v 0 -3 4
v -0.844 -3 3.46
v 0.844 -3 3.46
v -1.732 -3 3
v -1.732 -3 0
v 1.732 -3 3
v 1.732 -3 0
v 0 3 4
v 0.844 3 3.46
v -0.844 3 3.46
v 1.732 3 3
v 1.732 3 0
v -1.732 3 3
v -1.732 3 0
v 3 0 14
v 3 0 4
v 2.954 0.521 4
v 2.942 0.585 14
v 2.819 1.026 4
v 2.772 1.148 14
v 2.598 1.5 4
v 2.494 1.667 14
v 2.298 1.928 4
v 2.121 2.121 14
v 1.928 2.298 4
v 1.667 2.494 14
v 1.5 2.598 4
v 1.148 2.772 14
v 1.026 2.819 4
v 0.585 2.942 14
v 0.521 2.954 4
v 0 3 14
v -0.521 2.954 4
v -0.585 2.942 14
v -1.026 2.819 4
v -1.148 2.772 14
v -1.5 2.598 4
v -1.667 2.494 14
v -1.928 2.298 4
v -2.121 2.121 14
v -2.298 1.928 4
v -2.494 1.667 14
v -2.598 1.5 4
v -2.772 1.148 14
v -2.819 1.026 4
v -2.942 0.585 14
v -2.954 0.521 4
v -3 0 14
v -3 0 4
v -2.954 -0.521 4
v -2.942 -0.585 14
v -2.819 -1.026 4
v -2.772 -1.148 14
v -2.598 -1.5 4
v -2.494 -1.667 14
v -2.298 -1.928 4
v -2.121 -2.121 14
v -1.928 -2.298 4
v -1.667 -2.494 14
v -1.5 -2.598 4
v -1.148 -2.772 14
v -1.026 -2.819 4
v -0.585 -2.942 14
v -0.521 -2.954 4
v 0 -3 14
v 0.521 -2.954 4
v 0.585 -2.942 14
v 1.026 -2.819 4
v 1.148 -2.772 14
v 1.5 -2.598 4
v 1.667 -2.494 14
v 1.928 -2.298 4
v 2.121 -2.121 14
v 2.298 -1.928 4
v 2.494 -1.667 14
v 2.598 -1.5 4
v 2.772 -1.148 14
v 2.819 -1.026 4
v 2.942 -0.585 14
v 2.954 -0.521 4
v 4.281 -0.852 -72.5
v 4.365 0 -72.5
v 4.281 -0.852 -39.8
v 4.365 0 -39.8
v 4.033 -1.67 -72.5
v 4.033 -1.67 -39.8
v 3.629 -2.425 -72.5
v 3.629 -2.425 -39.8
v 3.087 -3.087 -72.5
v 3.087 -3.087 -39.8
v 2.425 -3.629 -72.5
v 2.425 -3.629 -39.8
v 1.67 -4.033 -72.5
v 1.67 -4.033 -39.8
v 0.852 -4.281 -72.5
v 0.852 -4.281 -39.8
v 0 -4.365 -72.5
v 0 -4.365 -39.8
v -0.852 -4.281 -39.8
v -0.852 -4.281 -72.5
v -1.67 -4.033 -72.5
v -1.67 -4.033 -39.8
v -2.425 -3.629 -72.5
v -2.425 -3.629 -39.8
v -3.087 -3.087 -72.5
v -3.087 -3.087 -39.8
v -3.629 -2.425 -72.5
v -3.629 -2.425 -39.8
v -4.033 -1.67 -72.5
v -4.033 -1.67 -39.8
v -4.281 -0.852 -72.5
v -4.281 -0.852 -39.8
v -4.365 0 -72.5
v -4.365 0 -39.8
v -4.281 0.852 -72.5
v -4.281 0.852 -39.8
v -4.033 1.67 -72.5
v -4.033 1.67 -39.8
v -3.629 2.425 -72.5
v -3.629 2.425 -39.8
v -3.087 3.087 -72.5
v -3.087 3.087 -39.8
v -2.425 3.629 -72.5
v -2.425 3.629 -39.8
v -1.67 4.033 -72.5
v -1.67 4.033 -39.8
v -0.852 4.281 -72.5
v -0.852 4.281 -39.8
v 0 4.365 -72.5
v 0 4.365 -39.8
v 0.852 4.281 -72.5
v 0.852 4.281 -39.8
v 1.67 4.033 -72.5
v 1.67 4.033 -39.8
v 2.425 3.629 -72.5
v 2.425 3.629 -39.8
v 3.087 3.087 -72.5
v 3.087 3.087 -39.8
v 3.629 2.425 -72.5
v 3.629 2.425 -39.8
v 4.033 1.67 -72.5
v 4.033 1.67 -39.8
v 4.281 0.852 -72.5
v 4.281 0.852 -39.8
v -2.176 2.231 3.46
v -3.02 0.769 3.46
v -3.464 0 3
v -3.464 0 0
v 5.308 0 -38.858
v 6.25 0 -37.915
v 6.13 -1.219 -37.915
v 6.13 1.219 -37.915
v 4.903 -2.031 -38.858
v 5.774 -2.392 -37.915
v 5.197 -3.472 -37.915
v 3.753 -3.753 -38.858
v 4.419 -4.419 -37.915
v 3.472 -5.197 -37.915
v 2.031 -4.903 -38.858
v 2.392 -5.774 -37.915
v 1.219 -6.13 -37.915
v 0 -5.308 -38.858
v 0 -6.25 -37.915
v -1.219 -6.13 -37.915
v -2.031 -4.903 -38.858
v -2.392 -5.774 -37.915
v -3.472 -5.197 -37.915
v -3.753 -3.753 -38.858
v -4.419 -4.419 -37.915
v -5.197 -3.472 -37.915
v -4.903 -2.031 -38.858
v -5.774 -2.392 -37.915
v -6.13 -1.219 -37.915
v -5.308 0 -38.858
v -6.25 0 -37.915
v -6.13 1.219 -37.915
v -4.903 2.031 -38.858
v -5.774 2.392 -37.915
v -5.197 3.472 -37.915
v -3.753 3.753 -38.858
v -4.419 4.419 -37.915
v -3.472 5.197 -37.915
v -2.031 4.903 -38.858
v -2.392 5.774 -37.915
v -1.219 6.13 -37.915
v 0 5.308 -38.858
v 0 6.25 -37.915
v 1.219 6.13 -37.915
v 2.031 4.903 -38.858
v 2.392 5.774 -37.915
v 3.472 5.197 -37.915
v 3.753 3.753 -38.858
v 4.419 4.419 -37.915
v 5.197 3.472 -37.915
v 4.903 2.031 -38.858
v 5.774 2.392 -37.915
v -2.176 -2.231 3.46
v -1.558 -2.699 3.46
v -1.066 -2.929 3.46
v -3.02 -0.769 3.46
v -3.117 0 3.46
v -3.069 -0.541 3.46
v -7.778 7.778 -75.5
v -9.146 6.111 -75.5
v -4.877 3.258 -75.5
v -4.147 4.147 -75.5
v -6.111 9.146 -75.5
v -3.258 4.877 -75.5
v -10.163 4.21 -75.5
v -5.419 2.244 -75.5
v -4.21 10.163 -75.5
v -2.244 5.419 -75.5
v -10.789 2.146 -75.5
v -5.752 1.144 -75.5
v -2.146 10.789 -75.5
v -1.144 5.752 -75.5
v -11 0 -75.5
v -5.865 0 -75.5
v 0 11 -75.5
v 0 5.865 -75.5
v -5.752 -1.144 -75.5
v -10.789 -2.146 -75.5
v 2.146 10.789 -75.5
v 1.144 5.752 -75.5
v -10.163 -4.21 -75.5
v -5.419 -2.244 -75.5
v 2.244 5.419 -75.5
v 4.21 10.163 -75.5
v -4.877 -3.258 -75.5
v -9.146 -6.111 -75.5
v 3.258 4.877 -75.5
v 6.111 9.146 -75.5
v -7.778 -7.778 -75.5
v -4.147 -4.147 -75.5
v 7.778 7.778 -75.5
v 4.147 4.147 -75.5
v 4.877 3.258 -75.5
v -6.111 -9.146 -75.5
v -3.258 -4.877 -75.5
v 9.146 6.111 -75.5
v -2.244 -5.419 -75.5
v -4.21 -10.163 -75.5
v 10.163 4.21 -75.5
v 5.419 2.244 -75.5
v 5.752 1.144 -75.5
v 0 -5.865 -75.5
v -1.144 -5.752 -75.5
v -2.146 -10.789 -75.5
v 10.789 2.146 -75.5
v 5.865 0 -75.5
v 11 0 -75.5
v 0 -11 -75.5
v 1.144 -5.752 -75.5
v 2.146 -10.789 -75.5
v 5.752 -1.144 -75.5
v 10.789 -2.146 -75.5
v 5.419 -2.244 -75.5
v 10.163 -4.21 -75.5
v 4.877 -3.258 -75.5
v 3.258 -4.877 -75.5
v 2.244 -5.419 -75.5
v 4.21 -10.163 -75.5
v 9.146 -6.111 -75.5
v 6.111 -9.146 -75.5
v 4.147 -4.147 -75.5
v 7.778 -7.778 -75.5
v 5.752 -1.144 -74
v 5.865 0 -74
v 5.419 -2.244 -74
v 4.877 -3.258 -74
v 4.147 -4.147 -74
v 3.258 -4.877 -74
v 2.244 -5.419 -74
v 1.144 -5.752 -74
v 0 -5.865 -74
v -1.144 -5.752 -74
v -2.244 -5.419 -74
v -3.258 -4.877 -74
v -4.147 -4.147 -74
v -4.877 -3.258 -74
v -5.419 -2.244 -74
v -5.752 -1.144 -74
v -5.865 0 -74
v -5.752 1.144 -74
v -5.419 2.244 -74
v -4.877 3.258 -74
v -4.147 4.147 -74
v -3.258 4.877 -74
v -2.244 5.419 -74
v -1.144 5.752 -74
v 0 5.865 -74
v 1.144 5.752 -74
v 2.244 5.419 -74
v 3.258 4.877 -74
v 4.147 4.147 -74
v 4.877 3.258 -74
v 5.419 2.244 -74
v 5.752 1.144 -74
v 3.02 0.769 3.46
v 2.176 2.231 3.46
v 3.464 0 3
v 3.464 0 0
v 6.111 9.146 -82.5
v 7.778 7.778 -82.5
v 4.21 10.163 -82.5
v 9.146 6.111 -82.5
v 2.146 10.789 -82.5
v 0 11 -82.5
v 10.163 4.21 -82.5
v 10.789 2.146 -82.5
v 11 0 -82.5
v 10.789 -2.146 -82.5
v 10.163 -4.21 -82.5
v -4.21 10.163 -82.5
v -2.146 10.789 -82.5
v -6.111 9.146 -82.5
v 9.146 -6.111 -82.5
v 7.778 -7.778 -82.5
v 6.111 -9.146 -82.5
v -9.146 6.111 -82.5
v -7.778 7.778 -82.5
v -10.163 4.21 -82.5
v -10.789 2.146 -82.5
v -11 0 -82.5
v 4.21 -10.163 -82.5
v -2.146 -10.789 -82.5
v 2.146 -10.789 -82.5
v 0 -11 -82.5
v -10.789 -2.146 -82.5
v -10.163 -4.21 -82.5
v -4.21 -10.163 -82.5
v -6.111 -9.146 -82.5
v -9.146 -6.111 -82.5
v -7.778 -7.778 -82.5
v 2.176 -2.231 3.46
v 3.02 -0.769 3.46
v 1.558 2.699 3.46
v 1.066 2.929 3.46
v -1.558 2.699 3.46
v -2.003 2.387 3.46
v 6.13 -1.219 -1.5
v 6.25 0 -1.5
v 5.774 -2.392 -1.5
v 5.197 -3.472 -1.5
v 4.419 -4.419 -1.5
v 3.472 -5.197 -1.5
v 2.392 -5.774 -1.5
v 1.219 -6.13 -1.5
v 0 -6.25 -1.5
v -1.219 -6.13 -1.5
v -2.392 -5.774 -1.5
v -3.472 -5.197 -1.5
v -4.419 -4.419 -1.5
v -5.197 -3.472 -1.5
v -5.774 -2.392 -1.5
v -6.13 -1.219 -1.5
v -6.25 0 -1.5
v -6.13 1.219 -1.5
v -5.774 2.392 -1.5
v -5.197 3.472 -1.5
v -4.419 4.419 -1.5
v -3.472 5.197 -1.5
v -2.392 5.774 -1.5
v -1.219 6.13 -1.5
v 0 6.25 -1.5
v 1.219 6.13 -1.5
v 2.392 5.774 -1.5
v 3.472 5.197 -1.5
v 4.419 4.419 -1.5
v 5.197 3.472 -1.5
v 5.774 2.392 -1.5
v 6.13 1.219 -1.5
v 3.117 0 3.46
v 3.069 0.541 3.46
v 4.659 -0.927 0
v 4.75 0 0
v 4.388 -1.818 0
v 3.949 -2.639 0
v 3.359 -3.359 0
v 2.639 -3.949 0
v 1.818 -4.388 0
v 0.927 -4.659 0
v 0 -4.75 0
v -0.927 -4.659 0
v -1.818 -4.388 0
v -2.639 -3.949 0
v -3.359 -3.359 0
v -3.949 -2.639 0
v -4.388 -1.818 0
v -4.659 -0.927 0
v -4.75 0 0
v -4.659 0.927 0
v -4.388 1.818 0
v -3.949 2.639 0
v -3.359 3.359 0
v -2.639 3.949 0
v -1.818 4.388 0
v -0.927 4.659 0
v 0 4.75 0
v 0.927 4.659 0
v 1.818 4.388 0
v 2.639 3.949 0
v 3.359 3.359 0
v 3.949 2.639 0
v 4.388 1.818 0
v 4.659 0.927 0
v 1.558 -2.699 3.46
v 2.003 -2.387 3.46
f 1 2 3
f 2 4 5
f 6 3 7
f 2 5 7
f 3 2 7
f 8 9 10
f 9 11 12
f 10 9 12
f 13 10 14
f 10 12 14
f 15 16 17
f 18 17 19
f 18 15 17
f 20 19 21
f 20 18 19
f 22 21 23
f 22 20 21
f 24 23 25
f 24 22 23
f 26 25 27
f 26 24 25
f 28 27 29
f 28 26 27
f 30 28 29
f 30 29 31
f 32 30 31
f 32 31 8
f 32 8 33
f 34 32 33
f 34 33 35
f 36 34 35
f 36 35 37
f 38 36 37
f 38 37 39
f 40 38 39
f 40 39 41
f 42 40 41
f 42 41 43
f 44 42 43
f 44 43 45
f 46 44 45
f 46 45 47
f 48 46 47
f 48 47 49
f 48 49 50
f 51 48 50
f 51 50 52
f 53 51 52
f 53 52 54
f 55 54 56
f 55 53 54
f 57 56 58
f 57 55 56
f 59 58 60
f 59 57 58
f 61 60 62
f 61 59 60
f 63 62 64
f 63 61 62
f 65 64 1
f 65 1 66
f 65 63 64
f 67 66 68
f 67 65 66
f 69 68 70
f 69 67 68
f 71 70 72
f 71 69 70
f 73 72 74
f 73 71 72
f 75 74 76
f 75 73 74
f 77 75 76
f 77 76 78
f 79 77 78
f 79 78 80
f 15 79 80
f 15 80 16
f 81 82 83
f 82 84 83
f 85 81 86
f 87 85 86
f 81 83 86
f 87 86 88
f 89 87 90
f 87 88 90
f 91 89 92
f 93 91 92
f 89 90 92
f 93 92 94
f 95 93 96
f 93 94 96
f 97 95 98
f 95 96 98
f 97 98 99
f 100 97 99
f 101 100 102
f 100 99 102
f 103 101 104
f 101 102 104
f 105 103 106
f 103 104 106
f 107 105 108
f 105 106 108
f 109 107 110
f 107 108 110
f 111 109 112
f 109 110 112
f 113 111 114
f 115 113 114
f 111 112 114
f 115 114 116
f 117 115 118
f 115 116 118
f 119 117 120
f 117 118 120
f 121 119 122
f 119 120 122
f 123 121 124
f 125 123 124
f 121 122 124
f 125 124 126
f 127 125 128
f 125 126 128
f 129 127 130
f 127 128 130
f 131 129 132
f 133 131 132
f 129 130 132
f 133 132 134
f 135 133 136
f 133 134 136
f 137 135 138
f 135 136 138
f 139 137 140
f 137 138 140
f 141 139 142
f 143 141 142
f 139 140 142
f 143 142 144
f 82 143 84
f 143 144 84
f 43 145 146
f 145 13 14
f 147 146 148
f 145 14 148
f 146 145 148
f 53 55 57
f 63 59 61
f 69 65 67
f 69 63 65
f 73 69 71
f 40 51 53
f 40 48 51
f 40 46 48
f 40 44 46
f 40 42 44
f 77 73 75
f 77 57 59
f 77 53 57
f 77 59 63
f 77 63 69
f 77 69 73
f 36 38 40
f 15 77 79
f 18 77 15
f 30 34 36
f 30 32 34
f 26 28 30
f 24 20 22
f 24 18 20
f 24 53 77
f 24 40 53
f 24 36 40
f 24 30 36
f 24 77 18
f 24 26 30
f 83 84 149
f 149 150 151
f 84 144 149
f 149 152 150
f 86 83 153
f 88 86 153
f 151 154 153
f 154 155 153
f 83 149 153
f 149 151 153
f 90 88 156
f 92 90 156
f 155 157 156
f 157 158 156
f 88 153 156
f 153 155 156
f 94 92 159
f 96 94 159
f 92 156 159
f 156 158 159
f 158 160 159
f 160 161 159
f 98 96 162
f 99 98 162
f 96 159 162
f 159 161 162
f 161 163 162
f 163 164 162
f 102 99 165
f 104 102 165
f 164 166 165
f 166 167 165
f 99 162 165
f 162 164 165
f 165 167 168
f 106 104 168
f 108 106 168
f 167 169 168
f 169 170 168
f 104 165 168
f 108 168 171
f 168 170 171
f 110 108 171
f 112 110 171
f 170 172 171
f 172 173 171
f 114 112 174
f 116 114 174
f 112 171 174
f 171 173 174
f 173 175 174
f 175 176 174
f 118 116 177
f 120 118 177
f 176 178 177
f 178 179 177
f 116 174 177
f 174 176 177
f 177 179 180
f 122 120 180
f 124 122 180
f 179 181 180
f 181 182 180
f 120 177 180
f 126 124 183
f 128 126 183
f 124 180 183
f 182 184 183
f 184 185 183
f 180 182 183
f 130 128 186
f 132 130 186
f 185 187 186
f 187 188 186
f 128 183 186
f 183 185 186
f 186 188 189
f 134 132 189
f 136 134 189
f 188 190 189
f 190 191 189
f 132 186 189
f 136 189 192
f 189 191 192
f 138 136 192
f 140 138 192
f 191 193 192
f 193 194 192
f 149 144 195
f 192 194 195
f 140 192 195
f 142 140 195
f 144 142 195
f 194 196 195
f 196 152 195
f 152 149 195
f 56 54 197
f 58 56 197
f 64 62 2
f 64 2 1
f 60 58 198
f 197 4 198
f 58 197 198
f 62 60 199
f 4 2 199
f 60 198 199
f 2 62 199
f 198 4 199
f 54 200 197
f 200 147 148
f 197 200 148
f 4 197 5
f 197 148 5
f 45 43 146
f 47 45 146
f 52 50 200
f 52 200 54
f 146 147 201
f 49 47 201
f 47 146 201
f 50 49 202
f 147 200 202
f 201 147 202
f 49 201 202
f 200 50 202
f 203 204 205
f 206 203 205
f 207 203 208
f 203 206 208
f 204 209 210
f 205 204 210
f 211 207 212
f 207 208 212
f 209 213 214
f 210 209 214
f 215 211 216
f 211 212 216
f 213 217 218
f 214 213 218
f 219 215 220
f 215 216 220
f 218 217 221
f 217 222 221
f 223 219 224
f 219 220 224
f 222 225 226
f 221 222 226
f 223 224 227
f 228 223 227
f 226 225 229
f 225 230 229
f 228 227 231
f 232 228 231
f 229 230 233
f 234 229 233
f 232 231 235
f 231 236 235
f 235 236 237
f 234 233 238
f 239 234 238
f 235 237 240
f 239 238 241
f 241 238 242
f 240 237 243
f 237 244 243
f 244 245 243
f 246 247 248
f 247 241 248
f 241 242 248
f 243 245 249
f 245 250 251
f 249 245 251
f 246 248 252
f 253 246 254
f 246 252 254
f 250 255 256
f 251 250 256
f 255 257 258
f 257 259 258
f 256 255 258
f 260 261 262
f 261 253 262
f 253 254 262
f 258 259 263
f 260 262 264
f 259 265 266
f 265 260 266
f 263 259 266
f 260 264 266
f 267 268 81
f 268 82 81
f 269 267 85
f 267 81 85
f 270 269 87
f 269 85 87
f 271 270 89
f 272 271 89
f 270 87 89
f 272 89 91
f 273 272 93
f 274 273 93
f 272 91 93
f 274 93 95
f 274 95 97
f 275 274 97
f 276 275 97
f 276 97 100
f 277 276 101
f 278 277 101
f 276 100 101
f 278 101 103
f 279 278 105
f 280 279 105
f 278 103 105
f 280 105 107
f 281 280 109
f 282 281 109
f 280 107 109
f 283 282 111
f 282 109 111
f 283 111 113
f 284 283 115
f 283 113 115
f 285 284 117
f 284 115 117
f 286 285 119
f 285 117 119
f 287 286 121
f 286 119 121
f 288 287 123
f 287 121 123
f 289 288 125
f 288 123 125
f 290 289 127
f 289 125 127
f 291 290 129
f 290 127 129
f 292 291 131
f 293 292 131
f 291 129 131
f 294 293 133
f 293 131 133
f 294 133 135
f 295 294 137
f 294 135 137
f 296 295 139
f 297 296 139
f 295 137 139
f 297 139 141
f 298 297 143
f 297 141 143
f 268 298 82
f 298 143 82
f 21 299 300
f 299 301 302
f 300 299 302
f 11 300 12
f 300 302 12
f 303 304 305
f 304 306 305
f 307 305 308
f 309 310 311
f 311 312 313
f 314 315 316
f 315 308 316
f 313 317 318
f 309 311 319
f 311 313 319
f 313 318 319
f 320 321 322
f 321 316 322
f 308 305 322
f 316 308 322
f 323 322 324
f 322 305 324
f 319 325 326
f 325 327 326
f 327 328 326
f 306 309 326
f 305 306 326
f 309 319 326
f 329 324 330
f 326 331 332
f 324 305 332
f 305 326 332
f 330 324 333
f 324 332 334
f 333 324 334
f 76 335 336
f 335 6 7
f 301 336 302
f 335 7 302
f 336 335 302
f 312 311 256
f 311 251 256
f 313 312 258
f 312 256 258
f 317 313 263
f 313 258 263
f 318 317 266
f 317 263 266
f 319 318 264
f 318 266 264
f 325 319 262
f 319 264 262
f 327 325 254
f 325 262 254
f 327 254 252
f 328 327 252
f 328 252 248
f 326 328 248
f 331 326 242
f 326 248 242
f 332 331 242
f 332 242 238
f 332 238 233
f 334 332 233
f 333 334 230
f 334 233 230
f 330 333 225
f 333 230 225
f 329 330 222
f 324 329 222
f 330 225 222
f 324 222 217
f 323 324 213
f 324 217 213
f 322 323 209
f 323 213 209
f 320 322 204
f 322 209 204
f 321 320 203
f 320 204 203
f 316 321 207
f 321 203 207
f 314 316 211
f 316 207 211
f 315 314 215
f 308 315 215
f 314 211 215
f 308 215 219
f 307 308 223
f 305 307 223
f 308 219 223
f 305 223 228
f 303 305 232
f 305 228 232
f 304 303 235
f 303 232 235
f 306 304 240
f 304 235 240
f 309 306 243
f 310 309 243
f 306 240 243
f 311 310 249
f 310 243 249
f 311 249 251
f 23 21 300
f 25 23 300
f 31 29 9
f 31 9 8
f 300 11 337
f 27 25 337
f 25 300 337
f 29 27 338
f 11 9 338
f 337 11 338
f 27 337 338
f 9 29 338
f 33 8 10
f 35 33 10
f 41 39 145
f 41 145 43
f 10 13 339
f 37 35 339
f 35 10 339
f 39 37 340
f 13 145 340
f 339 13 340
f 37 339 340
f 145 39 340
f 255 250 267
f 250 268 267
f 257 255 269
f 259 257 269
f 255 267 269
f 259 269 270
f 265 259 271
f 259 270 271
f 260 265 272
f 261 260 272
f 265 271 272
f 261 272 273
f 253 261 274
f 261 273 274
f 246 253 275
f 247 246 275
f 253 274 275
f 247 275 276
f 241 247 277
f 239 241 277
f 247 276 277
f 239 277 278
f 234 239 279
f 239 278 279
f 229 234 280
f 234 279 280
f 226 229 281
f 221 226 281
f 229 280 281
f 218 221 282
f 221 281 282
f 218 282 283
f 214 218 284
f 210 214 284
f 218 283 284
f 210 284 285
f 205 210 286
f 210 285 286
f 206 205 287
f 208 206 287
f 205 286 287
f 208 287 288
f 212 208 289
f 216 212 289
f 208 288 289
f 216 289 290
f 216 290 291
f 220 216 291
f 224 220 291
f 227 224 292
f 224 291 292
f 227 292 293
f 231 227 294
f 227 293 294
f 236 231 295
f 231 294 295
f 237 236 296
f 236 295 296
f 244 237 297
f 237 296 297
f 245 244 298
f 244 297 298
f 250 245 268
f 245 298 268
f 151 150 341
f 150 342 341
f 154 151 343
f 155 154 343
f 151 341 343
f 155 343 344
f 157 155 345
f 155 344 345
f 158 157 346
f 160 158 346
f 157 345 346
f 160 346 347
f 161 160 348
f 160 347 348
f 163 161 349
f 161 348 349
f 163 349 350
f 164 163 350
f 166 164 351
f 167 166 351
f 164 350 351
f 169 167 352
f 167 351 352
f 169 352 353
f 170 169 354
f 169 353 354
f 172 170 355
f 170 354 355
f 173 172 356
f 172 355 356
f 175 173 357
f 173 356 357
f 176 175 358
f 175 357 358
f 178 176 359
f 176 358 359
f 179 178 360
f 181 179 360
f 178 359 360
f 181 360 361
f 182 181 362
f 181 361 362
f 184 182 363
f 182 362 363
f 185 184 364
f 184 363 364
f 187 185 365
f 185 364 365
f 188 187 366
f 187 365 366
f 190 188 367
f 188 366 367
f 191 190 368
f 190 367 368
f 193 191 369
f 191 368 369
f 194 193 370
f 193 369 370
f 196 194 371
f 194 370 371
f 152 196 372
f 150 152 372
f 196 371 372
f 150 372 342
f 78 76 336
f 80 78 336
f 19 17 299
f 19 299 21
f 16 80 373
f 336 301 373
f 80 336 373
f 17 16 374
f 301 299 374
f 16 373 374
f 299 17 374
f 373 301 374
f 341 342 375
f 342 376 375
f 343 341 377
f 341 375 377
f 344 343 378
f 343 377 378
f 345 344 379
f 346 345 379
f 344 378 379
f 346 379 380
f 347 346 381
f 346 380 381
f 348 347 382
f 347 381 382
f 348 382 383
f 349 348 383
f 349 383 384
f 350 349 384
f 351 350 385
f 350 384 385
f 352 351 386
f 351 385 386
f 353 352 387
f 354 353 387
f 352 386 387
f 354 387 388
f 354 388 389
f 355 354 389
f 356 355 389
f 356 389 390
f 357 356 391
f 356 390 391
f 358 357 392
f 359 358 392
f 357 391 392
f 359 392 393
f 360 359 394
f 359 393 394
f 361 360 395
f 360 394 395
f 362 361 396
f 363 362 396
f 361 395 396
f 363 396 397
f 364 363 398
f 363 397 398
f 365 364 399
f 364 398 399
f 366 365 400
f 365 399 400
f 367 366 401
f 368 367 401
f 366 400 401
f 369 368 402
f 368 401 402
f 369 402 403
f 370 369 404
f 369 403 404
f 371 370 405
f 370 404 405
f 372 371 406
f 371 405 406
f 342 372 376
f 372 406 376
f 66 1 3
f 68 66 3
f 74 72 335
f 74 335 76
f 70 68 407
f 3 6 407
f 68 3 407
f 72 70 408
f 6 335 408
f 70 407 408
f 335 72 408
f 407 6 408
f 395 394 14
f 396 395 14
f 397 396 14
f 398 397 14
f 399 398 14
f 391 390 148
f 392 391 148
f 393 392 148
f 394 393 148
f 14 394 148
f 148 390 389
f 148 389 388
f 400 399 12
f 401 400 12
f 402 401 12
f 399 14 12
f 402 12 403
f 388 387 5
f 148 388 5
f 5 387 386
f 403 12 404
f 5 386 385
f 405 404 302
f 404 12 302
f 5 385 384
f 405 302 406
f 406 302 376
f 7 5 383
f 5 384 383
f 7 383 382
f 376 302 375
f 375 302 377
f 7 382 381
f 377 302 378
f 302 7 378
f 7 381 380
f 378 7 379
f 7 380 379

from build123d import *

# Parameters (mm, degrees)
BOSS_EXTRUDE1_DEPTH = 14
SKETCH3_OUTSIDE_W   = 44.278
SKETCH3_OUTSIDE_H   = 44.278
SKETCH3_OUTSIDE_R   = 3
CUT_EXTRUDE1_DEPTH  = 10


with BuildPart() as part:
    # Sketch1 → Revolve1 (revolve)
    with BuildSketch(Plane(origin=(0, 0, 0), x_dir=(1, 0, 0), z_dir=(0, 1, 0))):
        Polygon((0, 0), (0, 82.5), (11, 82.5), (11, 75.5), (5.865, 75.5), (5.865, 74), (4.365, 72.5), (4.365, 39.8), (6.25, 37.915), (6.25, 1.5), (4.75, 0), align=None)
    revolve(axis=Axis((0, 0, 0), (0, 0, -1)))

    # Sketch2 → Boss-Extrude1 (add)
    with BuildSketch(Plane.XY):
        Polygon((3.464101615, 0), (1.732050808, 3), (-1.732050808, 3), (-3.464101615, 0), (-1.732050808, -3), (1.732050808, -3), align=None)
    extrude(amount=BOSS_EXTRUDE1_DEPTH)

    # Sketch3 outside → Cut-Extrude1 (cut)
    with BuildSketch(Plane.XY.offset(14)):
        Rectangle(SKETCH3_OUTSIDE_W, SKETCH3_OUTSIDE_H)
        Circle(SKETCH3_OUTSIDE_R, mode=Mode.SUBTRACT)
    extrude(amount=-CUT_EXTRUDE1_DEPTH, mode=Mode.SUBTRACT)

    # Sketch4 → Cut-Revolve1 (revolve, cut)
    with BuildSketch(Plane(origin=(0, 0, 0), x_dir=(1, 0, 0), z_dir=(0, 1, 0))):
        with BuildLine():
            Line((3.464101615, -3), (3.464101615, -4))
            Line((3.464101615, -4), (3, -4))
            ThreePointArc((3, -4), (3.121679054, -3.448776291), (3.464101615, -3))
        make_face()
    revolve(axis=Axis((0, 0, 0), (0, 0, 1)), mode=Mode.SUBTRACT)


solid = part.part
